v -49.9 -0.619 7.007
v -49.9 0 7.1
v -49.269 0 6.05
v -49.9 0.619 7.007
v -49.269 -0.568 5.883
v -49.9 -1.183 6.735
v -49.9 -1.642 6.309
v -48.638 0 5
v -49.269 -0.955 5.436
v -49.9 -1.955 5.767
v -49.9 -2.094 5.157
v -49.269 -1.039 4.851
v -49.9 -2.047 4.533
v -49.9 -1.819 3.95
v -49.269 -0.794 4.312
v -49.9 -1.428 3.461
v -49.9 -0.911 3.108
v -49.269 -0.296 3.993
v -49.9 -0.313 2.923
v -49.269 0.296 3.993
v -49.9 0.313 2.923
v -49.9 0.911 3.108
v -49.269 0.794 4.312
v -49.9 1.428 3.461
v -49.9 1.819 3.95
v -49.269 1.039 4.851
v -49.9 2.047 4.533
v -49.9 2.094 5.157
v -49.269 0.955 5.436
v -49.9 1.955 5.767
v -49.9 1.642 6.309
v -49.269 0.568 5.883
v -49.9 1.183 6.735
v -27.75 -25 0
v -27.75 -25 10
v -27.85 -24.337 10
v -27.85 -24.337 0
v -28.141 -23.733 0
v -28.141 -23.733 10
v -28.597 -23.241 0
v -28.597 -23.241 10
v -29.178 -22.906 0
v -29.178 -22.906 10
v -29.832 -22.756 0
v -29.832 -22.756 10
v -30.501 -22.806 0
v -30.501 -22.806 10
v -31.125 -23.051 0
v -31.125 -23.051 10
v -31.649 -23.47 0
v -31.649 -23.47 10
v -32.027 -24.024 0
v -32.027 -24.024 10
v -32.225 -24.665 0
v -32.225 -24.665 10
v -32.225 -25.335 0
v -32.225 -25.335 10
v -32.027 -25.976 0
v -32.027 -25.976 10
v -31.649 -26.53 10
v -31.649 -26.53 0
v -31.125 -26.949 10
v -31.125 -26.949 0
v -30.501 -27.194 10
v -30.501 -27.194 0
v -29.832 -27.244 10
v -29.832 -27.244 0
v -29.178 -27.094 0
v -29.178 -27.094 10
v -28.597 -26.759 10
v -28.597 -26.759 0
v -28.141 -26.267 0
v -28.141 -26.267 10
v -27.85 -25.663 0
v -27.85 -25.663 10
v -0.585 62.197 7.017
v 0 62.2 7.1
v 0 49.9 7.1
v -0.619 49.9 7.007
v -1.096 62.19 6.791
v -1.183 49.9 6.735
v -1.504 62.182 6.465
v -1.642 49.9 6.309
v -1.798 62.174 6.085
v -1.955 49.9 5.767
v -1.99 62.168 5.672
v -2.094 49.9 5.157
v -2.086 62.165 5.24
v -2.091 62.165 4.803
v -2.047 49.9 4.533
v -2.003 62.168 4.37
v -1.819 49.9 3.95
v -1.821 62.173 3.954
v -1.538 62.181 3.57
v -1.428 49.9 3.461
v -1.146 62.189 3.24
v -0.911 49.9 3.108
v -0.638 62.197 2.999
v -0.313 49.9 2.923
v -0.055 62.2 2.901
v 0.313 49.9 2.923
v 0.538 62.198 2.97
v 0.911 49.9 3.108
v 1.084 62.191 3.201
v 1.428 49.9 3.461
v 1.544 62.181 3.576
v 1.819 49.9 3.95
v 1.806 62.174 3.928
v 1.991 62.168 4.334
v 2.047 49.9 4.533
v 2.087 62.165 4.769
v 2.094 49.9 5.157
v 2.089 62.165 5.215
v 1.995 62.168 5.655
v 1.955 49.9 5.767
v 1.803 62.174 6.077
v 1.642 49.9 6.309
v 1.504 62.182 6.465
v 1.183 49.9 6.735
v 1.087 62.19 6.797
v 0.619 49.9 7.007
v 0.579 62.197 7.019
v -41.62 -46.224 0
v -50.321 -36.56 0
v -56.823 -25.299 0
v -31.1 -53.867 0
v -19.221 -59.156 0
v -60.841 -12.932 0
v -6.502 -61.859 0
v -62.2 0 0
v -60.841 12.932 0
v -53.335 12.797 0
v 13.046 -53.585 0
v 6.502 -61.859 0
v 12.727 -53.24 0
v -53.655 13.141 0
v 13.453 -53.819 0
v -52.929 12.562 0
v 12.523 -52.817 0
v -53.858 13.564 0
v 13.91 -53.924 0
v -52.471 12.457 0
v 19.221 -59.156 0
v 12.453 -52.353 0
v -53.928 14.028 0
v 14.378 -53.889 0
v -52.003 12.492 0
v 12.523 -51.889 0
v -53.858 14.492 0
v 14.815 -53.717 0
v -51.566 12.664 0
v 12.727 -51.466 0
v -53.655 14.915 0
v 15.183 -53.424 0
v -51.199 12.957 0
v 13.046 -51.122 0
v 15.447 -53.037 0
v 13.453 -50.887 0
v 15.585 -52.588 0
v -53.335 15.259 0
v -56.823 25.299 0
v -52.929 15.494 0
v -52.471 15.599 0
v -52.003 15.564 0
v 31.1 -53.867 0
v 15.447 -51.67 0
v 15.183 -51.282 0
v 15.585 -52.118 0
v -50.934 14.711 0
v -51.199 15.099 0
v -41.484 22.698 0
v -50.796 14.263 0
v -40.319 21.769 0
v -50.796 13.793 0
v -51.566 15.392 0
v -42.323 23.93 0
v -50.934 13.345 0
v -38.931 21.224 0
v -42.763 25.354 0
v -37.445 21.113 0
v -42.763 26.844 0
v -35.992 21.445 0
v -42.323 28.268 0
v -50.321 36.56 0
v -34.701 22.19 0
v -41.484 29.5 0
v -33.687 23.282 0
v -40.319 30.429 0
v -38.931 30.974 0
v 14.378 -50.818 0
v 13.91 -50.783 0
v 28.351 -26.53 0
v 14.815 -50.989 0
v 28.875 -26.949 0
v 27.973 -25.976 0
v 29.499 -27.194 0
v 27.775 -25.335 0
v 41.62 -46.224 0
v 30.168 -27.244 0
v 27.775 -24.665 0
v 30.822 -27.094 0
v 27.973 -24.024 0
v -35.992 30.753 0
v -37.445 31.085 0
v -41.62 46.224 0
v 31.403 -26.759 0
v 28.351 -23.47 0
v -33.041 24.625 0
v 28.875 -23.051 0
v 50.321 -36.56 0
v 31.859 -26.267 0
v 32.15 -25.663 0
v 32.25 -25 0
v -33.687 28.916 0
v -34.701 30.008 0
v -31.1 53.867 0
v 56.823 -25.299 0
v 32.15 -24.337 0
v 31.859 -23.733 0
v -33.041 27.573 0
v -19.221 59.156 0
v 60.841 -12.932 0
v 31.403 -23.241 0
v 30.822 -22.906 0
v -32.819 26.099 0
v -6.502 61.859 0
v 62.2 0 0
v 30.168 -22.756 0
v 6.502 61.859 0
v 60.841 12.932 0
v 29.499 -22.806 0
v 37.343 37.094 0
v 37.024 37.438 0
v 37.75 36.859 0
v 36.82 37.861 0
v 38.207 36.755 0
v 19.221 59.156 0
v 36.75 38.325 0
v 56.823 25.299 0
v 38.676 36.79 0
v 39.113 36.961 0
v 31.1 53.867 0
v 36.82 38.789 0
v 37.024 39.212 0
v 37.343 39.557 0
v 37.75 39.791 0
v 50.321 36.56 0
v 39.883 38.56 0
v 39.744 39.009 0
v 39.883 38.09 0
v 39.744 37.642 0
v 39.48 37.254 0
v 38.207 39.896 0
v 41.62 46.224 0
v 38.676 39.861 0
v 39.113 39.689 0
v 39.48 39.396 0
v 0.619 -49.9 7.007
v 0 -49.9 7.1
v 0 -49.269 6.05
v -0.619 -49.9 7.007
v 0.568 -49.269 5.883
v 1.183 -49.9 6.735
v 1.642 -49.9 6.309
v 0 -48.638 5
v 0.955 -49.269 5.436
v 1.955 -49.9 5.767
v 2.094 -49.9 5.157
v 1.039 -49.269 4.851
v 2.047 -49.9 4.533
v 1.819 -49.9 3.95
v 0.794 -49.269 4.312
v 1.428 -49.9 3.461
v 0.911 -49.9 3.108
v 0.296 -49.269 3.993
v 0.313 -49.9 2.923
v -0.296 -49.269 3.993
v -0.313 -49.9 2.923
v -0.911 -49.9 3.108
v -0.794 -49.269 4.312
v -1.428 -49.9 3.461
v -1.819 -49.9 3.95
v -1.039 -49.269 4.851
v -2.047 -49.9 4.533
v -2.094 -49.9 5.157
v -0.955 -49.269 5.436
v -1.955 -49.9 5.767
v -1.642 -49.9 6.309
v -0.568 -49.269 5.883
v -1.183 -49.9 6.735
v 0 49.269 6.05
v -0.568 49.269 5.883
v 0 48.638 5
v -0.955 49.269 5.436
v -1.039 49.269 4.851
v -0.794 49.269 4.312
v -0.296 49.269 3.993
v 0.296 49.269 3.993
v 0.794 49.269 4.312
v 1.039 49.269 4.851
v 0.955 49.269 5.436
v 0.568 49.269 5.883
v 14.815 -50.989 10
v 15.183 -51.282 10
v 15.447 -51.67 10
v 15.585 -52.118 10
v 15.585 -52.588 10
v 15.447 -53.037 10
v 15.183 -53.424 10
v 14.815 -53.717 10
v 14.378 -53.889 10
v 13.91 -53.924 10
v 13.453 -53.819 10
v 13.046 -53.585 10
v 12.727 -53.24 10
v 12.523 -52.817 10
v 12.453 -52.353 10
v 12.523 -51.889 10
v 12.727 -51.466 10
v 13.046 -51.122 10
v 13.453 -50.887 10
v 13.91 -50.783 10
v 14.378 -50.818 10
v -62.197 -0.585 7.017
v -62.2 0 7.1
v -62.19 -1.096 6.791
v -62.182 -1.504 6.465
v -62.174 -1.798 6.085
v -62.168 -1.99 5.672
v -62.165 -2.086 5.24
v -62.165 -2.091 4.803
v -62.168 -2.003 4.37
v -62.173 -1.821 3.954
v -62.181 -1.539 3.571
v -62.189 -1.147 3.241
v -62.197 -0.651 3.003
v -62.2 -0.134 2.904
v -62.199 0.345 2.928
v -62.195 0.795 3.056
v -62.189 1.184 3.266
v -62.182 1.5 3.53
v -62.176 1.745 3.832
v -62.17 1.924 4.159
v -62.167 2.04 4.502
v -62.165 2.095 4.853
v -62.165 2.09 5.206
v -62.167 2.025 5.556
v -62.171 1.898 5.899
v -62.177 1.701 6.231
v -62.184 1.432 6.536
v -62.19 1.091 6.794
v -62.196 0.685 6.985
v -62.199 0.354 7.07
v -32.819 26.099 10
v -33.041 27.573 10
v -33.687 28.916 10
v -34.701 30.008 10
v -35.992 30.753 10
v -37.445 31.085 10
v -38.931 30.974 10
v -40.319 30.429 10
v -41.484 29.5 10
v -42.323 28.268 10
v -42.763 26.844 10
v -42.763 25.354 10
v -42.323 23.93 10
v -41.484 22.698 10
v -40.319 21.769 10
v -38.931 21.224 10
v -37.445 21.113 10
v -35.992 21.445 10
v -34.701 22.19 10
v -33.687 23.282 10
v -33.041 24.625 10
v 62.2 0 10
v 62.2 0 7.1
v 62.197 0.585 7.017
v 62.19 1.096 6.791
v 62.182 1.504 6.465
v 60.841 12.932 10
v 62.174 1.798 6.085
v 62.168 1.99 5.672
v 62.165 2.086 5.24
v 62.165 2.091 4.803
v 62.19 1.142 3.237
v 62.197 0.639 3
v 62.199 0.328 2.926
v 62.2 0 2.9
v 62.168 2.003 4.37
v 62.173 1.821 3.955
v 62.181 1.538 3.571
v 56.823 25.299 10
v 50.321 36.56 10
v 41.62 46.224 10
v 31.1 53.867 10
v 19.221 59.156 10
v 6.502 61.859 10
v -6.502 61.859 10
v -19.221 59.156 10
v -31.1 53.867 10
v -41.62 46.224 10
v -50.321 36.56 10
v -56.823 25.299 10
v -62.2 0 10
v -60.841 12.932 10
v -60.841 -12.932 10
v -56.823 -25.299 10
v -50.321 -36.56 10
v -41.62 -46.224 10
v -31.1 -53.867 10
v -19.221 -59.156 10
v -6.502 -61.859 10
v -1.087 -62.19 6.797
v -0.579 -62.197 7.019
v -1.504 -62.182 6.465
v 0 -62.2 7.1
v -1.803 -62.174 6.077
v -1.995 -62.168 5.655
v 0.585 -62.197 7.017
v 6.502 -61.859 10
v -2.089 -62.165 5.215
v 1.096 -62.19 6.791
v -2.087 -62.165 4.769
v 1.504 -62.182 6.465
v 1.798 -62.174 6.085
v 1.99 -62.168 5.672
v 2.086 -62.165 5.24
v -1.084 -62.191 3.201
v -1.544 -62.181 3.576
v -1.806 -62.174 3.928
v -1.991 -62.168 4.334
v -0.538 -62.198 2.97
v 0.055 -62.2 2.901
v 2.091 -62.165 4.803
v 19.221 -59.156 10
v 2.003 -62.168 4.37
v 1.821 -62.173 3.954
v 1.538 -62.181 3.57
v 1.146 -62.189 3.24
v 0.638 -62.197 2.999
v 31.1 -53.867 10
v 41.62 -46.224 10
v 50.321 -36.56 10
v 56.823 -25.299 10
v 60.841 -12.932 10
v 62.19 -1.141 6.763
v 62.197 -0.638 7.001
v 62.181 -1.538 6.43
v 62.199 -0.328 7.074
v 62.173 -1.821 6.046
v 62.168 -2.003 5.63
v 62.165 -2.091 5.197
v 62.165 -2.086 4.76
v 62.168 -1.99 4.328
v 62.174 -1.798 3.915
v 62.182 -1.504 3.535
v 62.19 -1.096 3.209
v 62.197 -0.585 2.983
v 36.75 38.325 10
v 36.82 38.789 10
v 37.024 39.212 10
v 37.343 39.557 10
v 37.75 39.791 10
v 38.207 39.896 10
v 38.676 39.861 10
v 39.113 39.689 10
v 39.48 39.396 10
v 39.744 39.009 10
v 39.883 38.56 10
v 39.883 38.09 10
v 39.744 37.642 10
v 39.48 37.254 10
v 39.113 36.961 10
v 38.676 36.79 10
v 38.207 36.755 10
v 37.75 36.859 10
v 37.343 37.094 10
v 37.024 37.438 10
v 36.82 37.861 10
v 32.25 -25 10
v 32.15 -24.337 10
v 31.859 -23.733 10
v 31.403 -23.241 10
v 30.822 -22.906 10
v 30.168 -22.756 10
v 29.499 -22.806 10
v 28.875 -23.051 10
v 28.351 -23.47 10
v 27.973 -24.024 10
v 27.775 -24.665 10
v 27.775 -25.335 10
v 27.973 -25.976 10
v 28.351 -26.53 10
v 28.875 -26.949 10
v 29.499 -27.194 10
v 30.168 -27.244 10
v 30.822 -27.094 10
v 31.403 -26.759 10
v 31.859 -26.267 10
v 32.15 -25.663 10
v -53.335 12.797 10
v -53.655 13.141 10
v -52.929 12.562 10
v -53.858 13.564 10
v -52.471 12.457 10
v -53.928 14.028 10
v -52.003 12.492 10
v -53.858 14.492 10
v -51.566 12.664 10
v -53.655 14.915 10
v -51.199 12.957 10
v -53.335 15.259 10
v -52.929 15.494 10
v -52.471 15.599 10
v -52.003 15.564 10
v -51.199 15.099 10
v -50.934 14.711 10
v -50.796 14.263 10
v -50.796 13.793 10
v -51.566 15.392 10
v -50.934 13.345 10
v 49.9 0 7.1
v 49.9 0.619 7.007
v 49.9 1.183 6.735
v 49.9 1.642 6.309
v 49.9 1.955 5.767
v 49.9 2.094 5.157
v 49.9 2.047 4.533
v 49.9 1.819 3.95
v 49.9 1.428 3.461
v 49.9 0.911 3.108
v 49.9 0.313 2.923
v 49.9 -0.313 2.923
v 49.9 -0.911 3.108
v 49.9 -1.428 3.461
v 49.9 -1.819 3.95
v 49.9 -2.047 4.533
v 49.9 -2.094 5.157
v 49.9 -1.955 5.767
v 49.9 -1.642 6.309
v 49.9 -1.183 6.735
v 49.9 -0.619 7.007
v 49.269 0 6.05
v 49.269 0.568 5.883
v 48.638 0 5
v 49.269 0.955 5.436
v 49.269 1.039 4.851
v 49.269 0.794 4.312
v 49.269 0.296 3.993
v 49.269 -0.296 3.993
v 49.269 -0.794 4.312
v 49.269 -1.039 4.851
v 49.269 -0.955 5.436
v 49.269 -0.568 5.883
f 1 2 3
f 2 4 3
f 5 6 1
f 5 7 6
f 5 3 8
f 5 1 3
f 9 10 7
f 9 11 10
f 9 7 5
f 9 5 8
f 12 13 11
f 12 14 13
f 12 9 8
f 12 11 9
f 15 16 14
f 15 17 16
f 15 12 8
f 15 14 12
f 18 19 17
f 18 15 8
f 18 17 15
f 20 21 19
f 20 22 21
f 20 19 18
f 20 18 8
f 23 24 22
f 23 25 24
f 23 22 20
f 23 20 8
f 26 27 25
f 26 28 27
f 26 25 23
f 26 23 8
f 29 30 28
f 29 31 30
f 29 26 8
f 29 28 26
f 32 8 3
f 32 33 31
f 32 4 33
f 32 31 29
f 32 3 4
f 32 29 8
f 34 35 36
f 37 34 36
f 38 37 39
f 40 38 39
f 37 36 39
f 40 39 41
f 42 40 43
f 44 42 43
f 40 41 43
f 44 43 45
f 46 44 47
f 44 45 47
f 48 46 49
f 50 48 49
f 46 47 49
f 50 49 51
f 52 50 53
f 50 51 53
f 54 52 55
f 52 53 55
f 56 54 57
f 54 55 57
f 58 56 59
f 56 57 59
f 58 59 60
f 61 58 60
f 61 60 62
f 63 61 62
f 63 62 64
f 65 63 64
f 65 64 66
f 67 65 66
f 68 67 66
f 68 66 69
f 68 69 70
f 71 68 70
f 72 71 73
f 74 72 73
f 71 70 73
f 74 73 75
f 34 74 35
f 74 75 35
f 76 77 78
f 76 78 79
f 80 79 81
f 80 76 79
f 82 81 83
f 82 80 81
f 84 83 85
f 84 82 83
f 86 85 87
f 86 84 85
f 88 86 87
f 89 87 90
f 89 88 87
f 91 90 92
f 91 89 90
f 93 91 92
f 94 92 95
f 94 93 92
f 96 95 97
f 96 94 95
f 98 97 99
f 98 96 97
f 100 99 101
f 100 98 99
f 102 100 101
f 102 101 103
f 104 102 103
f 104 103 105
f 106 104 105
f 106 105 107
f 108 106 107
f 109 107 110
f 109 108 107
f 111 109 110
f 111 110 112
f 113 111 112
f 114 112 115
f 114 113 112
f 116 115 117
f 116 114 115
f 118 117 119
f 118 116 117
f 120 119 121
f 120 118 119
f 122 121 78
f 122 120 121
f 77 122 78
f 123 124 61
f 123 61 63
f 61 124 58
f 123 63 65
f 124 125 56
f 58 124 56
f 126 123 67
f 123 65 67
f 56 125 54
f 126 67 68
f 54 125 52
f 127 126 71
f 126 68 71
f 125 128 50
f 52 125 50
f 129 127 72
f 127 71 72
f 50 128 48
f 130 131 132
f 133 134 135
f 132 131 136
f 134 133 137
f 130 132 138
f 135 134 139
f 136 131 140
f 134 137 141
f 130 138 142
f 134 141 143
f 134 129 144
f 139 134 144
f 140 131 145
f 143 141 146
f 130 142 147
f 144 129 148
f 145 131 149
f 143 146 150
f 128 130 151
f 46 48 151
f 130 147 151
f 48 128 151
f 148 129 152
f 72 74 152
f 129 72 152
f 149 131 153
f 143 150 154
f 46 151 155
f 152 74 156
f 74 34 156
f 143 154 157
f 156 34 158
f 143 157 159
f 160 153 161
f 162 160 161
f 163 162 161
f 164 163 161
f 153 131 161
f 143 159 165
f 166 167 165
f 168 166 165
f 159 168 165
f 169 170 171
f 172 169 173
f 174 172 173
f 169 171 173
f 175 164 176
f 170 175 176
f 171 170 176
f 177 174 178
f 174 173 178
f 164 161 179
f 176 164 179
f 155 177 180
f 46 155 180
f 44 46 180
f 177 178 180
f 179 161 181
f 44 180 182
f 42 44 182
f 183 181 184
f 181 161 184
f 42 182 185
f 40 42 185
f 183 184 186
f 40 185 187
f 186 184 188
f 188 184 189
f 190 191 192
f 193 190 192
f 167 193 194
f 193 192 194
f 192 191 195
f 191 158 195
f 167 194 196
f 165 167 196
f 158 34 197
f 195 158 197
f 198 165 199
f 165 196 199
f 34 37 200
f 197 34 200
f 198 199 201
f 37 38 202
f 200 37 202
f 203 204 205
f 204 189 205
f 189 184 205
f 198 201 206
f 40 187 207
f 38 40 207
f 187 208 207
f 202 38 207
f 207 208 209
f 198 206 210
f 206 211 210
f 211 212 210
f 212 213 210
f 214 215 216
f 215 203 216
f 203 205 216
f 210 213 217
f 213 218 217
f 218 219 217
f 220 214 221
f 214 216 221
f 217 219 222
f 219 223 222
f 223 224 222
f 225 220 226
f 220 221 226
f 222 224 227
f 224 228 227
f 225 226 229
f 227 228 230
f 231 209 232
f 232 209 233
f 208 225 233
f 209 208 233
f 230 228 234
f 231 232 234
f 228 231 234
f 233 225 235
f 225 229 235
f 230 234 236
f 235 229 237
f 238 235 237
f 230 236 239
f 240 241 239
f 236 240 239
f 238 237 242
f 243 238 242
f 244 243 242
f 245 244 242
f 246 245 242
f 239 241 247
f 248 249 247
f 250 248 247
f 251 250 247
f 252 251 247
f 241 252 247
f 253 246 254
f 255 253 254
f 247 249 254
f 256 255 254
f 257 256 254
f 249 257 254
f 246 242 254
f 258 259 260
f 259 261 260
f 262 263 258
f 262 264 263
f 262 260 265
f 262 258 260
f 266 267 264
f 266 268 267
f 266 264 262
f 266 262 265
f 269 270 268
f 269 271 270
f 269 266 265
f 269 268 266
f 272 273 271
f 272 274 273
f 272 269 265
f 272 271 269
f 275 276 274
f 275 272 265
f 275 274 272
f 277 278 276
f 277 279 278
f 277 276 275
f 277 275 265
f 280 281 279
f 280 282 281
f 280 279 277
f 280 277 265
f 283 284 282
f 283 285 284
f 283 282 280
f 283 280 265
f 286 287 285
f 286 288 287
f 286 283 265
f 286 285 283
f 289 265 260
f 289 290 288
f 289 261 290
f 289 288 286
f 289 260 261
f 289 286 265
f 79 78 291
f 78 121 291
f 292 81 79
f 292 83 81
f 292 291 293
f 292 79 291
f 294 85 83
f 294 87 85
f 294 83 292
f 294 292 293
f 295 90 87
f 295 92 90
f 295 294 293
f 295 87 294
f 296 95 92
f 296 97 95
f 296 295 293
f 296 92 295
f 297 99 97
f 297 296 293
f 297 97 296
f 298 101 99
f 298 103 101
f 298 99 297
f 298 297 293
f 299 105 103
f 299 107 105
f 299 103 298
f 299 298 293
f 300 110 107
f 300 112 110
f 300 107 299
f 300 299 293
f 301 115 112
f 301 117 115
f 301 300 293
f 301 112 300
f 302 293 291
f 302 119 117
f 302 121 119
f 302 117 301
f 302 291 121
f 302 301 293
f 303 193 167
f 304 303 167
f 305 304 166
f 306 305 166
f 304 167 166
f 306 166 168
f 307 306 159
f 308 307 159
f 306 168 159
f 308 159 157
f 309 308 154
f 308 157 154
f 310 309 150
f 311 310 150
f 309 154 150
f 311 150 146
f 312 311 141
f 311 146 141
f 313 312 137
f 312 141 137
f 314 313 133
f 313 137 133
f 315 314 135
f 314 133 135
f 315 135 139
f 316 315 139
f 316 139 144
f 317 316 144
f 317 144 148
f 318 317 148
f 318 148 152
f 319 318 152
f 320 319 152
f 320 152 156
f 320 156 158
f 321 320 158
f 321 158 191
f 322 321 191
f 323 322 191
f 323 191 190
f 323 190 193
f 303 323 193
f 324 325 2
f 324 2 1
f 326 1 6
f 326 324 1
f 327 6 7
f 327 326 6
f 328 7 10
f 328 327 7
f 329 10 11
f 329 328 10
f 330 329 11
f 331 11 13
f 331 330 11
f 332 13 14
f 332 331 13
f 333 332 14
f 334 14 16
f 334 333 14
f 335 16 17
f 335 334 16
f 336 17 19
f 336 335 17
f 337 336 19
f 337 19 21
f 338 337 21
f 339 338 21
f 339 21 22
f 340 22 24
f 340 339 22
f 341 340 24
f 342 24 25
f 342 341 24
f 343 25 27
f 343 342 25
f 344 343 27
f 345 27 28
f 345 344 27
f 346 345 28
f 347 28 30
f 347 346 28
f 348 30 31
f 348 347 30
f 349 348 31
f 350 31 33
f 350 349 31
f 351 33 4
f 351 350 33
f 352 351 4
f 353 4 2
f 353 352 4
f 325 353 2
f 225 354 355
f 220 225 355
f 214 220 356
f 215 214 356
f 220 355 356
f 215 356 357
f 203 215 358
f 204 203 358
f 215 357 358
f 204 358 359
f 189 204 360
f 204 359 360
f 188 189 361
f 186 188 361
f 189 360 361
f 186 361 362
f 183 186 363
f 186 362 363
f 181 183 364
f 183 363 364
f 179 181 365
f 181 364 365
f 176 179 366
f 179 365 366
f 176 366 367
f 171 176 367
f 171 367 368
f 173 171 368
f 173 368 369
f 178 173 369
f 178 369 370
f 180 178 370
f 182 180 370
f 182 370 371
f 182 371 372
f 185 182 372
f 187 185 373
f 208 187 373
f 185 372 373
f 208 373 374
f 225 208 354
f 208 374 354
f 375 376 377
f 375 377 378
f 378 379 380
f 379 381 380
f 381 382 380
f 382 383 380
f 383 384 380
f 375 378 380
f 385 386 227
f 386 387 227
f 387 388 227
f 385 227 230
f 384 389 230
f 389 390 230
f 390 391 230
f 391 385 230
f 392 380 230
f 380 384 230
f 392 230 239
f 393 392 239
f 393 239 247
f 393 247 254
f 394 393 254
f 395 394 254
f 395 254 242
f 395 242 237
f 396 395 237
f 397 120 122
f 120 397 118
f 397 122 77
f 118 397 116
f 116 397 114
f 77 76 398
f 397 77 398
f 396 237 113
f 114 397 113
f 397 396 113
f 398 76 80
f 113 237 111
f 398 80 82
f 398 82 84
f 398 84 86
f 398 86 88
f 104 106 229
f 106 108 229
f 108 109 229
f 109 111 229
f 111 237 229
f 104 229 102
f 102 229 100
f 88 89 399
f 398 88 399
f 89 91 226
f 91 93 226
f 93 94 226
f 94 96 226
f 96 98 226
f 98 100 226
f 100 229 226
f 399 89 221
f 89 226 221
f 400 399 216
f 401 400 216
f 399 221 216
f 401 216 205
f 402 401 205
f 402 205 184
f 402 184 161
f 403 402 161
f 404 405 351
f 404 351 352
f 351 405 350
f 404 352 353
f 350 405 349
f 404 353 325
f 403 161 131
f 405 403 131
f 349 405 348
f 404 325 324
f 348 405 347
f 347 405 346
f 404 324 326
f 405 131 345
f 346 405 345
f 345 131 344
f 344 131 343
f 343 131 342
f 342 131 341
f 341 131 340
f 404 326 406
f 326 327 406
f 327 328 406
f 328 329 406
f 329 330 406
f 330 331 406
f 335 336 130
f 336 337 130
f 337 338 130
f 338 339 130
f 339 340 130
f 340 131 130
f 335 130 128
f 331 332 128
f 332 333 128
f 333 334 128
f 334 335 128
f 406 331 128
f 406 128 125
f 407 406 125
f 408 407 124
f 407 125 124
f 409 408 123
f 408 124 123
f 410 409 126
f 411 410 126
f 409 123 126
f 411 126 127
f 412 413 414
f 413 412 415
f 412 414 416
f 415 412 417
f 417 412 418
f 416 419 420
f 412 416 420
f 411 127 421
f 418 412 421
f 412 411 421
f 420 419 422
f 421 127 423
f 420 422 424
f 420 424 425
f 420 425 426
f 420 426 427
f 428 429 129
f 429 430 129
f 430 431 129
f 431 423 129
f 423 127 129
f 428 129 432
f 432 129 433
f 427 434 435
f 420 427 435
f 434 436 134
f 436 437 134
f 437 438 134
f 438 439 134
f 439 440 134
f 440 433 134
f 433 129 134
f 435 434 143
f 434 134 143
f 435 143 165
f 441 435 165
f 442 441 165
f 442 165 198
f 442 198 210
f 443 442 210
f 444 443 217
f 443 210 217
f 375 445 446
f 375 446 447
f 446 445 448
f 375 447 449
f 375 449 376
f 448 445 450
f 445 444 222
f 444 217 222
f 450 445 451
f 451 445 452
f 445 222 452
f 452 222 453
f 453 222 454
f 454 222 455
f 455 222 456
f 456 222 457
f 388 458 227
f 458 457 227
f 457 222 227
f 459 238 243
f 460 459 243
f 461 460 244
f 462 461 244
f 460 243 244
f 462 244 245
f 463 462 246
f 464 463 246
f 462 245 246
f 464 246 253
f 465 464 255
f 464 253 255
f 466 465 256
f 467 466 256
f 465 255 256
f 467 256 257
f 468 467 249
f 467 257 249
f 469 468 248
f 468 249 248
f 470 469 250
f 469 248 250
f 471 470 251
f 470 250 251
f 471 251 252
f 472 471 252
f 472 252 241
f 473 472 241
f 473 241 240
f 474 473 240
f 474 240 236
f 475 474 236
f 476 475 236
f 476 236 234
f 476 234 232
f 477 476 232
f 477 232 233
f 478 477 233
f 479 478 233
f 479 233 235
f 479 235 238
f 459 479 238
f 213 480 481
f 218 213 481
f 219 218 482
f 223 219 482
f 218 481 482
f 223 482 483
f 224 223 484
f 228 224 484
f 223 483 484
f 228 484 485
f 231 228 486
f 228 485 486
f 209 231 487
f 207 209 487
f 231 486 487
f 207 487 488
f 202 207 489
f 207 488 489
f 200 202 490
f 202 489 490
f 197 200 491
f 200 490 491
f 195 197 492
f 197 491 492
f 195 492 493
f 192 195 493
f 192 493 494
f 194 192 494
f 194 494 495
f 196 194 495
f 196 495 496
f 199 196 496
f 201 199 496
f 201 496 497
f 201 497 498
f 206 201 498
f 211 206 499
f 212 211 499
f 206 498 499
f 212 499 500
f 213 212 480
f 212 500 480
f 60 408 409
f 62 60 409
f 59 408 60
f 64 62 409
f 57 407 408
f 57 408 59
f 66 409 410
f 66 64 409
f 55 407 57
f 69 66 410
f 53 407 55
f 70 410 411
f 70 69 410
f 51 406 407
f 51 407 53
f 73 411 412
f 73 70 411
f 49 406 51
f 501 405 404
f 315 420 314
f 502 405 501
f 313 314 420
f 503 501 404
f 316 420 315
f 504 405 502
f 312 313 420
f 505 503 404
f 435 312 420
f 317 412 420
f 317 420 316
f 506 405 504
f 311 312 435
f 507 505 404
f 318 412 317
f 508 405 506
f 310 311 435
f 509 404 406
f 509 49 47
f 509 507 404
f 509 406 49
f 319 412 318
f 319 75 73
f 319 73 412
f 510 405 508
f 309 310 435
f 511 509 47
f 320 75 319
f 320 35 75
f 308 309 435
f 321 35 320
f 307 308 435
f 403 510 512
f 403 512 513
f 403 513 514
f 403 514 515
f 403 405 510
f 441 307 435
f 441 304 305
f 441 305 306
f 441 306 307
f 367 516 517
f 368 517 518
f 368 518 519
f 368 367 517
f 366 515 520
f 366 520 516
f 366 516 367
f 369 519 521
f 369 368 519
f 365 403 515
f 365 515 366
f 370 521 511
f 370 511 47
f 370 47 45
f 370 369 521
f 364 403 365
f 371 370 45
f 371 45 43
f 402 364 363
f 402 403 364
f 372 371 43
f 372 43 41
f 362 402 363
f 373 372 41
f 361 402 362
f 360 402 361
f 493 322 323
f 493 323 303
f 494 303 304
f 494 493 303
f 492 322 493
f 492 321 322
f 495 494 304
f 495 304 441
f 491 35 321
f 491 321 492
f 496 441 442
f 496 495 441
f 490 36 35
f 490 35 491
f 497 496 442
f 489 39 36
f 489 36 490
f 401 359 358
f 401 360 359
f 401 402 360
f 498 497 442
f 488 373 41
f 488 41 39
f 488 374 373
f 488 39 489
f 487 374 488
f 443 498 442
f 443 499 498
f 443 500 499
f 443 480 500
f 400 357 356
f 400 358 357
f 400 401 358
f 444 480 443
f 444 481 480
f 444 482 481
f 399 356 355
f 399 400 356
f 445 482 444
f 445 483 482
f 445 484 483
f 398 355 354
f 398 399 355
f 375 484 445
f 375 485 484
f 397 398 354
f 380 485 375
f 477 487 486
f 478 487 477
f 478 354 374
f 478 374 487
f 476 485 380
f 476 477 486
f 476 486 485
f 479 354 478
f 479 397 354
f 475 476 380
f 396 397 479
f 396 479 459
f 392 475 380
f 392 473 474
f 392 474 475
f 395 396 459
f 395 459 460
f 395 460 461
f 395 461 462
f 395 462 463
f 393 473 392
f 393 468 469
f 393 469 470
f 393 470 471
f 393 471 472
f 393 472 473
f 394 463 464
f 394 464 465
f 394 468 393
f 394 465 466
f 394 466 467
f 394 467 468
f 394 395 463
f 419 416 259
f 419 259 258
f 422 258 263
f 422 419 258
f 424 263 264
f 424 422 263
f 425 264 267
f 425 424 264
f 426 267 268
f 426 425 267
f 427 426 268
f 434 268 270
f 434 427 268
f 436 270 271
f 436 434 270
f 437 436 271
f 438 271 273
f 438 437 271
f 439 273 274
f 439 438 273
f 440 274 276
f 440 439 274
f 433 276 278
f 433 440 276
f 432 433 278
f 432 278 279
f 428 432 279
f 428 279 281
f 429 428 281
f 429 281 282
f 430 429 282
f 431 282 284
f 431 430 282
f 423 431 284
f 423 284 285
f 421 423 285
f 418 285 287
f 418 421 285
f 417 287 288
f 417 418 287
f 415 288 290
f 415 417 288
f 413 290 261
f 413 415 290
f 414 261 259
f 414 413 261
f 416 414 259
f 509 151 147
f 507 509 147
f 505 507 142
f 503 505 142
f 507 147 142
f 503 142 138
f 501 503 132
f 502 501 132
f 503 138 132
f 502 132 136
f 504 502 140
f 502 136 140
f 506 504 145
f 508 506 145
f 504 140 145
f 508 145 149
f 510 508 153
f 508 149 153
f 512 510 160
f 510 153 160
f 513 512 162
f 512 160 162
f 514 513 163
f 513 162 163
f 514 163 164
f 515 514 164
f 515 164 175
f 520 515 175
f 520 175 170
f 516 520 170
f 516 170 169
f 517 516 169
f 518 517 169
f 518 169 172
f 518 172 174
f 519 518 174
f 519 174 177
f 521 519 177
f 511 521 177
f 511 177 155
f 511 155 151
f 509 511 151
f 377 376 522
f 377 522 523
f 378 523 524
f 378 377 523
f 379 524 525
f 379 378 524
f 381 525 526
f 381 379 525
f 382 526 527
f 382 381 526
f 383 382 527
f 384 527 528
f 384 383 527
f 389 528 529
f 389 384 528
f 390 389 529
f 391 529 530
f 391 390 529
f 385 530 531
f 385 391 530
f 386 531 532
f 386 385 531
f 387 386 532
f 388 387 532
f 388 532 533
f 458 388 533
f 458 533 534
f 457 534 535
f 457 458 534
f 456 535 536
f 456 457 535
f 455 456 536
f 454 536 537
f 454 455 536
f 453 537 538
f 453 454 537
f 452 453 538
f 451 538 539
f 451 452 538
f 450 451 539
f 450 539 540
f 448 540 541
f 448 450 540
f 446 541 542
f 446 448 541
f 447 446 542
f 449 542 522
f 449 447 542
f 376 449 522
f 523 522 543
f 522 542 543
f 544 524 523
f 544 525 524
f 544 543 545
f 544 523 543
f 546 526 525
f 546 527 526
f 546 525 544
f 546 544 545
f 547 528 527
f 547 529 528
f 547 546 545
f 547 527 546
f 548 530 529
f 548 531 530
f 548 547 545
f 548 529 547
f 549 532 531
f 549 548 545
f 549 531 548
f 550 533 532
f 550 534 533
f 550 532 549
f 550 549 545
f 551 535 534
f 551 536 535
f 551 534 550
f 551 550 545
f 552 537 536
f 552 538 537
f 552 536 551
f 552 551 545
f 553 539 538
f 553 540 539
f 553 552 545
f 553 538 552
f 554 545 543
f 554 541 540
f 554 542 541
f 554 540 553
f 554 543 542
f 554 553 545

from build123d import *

# Parameters (mm, degrees)
IZIM1_R                             = 62.2
Y_KSEKLIK_EKSTR_ZYON1_DEPTH         = 10
M3X0_5_HELISARMAL_IN_DI_LI_DELIK2_D = 3.15
DAIRESEL_KAPLAMA1_COUNT             = 3
IZIM5_R                             = 5
KES_EKSTR_ZYON1_DEPTH               = 10
IZIM6_R                             = 2.25
KES_EKSTR_ZYON2_DEPTH               = 10
DAIRESEL_KAPLAMA2_COUNT             = 4


with BuildPart() as part:
    # Çizim1 → Yükseklik-Ekstrüzyon1 (new body)
    with BuildSketch(Plane.XY):
        Circle(IZIM1_R)
    extrude(amount=Y_KSEKLIK_EKSTR_ZYON1_DEPTH)

    # M3x0.5 Helisarmal İçin Dişli Delik2 (through all)
    with Locations(Plane.XY.offset(10)):
        with Locations((38.32518754, 38.32518754)):
            m3x0_5_helisarmal_in_di_li_delik2 = Hole(M3X0_5_HELISARMAL_IN_DI_LI_DELIK2_D / 2)

    # Dairesel Kaplama1: M3x0.5 Helisarmal İçin Dişli Delik2 ×3 about axis
    dairesel_kaplama1_axis = Axis((0, 0, 0), (0, 0, 1))
    for i in range(1, DAIRESEL_KAPLAMA1_COUNT):
        add(m3x0_5_helisarmal_in_di_li_delik2.rotate(dairesel_kaplama1_axis, i * 360 / DAIRESEL_KAPLAMA1_COUNT), mode=Mode.SUBTRACT)

    # Çizim5 → Kes-Ekstrüzyon1 (cut)
    with BuildSketch(Plane.XY.offset(10)):
        with Locations((-37.818561572, 26.099021067)):
            Circle(IZIM5_R)
    extrude(amount=-KES_EKSTR_ZYON1_DEPTH, mode=Mode.SUBTRACT)

    # Çizim6 → Kes-Ekstrüzyon2 (cut)
    with BuildSketch(Plane.XY.offset(10)):
        with Locations((30, -25)):
            Circle(IZIM6_R)
        with Locations((-30, -25)):
            Circle(IZIM6_R)
    extrude(amount=-KES_EKSTR_ZYON2_DEPTH, mode=Mode.SUBTRACT)

    # Çizim10 → M4x0.7 Helisarmal İçin Dişli Delik4 (revolve, cut)
    with BuildSketch(Plane(origin=(0, 62.2, 5), x_dir=(0, 0, 1), z_dir=(1, 0, 0))):
        Polygon((0, 0), (0, 13.5618073), (2.1, 12.3), (2.1, 0), align=None)
    m4x0_7_helisarmal_in_di_li_delik4 = revolve(axis=Axis((0, 68.55, 5), (0, -1, 0)), mode=Mode.SUBTRACT)

    # Dairesel Kaplama2: M4x0.7 Helisarmal İçin Dişli Delik4 ×4 about axis
    dairesel_kaplama2_axis = Axis((0, 0, 0), (0, 0, 1))
    for i in range(1, DAIRESEL_KAPLAMA2_COUNT):
        add(m4x0_7_helisarmal_in_di_li_delik4.rotate(dairesel_kaplama2_axis, i * 360 / DAIRESEL_KAPLAMA2_COUNT), mode=Mode.SUBTRACT)


solid = part.part
